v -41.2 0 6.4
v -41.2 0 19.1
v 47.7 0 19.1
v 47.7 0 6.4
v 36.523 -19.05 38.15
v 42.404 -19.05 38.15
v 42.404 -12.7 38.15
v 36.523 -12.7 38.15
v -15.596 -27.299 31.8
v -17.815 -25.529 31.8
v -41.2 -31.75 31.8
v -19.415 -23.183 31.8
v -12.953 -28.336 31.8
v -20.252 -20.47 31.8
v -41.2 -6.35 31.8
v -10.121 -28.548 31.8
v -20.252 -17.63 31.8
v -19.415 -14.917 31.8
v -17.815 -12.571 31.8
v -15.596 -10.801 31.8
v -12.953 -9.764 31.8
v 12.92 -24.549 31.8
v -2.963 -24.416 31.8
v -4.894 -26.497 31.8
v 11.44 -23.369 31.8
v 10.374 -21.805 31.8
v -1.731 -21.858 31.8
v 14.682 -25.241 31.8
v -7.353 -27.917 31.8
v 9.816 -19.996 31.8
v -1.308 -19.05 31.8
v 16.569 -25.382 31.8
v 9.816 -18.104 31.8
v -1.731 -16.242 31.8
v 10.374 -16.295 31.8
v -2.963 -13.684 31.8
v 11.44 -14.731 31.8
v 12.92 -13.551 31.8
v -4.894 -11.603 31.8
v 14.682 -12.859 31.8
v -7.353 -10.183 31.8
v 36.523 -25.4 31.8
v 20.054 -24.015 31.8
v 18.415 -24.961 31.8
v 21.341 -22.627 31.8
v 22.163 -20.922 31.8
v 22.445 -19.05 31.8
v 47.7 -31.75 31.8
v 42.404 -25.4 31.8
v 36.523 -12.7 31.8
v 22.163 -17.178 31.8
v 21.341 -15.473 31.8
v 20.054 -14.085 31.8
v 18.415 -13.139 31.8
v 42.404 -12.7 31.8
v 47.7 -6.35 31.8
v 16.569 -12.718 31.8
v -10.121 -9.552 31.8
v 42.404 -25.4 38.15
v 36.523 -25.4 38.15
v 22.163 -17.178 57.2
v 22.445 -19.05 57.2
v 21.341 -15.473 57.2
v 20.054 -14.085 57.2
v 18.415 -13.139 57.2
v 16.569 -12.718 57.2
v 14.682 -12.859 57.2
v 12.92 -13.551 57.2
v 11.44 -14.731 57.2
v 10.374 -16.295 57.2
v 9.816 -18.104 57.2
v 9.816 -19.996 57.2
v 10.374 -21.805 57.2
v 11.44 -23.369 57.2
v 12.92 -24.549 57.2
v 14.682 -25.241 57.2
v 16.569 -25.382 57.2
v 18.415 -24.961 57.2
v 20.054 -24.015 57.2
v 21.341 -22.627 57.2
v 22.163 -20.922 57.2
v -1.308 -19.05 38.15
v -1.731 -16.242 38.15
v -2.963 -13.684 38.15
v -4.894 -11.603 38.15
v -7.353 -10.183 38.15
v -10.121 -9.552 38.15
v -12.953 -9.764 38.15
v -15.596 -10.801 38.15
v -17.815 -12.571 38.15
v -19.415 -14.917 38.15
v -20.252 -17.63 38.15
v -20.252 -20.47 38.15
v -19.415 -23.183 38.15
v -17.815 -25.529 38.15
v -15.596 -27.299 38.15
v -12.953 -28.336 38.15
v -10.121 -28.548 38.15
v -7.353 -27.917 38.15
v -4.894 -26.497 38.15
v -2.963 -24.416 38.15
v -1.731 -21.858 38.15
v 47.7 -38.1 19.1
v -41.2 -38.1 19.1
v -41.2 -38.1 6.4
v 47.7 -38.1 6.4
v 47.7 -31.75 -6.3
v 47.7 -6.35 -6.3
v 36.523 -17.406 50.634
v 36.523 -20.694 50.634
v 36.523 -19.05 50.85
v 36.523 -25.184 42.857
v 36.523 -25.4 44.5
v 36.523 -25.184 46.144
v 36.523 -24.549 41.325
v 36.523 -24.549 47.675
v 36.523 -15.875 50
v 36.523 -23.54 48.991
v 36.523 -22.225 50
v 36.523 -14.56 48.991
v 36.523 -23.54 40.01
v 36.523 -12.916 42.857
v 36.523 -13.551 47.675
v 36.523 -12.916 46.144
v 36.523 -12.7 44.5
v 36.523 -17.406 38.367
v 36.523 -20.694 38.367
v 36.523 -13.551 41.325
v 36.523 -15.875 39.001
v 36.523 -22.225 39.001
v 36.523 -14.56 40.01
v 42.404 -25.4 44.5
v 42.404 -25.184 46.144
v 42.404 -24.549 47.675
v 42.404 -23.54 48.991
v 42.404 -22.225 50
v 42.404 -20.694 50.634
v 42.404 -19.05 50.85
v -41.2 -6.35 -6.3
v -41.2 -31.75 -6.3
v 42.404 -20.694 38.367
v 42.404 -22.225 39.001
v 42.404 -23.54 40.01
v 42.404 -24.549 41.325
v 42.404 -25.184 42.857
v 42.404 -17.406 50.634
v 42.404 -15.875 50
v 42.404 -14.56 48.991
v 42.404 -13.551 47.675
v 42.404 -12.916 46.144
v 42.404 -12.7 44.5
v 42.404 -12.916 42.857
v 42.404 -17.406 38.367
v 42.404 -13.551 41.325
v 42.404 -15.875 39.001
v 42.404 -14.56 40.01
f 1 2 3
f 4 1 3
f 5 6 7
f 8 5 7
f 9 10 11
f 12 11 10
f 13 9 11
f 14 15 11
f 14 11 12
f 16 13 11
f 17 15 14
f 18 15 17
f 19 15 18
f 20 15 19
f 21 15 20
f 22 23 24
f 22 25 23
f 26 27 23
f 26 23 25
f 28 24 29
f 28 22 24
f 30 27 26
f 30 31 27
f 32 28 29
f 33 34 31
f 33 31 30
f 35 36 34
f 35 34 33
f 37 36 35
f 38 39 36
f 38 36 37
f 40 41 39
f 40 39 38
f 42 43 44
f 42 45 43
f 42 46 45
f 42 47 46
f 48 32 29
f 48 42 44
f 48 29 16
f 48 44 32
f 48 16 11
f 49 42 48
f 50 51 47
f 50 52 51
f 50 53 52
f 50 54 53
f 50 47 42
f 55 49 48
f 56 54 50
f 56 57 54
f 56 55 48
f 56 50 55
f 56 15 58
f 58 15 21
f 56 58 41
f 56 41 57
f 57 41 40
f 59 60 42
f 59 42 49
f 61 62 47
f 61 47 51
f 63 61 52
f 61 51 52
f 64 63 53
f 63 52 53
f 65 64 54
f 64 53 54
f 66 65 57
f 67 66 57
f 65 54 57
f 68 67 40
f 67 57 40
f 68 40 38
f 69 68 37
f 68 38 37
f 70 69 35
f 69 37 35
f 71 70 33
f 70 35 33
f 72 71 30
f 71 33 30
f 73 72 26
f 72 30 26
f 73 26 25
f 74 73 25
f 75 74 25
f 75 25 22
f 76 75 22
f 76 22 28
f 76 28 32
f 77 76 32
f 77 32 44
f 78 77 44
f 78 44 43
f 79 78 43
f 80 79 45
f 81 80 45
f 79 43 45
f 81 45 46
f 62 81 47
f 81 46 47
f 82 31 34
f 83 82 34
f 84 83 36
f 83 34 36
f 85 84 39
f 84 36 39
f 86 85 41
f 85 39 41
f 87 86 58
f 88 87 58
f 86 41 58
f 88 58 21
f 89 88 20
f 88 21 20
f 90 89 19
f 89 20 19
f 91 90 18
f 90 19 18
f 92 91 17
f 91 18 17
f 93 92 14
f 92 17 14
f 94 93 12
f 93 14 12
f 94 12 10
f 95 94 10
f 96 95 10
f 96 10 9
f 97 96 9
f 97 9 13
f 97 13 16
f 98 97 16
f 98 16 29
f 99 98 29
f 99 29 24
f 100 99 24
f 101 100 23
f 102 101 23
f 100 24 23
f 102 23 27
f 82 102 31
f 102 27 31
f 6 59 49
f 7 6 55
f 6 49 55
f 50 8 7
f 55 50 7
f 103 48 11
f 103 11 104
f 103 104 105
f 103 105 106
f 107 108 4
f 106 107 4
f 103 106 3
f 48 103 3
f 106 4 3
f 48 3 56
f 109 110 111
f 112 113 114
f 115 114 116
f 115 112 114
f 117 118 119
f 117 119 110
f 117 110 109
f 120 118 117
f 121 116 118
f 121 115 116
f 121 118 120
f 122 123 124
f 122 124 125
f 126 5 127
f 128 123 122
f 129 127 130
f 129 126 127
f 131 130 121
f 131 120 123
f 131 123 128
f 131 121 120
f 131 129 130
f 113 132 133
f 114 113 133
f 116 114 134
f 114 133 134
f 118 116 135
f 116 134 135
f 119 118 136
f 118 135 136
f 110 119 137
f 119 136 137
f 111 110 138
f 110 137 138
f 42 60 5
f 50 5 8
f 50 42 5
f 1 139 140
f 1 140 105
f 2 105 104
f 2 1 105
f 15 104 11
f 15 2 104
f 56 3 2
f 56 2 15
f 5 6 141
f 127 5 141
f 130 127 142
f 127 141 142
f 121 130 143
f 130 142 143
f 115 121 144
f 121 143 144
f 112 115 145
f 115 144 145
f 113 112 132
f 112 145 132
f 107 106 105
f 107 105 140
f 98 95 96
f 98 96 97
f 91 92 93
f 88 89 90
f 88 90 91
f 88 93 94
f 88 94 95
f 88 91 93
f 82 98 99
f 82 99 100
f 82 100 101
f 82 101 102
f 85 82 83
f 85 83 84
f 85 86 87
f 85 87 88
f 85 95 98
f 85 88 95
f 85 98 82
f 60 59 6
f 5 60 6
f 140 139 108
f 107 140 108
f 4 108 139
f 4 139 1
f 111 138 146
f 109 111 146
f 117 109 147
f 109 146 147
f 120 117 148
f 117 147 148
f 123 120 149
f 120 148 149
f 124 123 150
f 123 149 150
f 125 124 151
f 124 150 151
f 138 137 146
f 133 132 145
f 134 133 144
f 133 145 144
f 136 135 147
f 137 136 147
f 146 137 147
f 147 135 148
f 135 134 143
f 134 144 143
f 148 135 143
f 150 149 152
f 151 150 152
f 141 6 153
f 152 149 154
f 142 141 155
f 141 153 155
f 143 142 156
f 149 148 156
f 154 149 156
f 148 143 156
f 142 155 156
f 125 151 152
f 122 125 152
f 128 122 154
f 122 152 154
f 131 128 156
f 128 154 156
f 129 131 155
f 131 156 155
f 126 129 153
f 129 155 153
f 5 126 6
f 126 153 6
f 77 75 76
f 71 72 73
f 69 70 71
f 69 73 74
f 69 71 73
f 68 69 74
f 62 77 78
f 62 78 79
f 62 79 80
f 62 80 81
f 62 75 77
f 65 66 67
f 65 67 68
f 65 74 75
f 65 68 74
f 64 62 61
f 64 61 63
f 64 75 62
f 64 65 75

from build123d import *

# Parameters (mm, degrees)
F0_W     = 88.9
F0_H     = 38.1
F1_DEPTH = 38.1
F3_DEPTH = 88.901
F4_R     = 6.35
F5_DEPTH = 25.4
F4_R_2   = 9.525
F6_DEPTH = 6.35
F4_W     = 5.880814
F4_H     = 12.7
F7_DEPTH = 19.05
F9_DEPTH = 5.880814


with BuildPart() as f1:
    # F0 (on Front) → F1 (new body)
    with BuildSketch(Plane.XZ):
        with Locations((3.249921, 12.750378)):
            Rectangle(F0_W, F0_H)
    extrude(amount=F1_DEPTH)

    # F2 (on face) → F3 (cut, through all)
    with BuildSketch(Plane(origin=(-41.200079, 0, 0), x_dir=(0, -1, 0), z_dir=(-1, 0, 0))):
        Polygon((0, 31.800378), (0, 19.100378), (6.35, 31.800378), align=None)
        Polygon((6.35, -6.299622), (0, 6.400378), (0, -6.299622), align=None)
        Polygon((38.1, 6.400378), (31.75, -6.299622), (38.1, -6.299622), align=None)
        Polygon((38.1, 31.800378), (31.75, 31.800378), (38.1, 19.100378), align=None)
    extrude(amount=-F3_DEPTH, mode=Mode.SUBTRACT)

    # F4 (on face) → F5 (join)
    with BuildSketch(Plane.XY.offset(31.800378)):
        with Locations((16.094854, -19.05)):
            Circle(F4_R)
    extrude(amount=F5_DEPTH)

    # F4 (on face) → F6 (join)
    with BuildSketch(Plane.XY.offset(31.800378)):
        with Locations((-10.833076, -19.05)):
            Circle(F4_R_2)
    extrude(amount=F6_DEPTH)

    # F4 (on face) → F7 (join)
    with BuildSketch(Plane.XY.offset(31.800378)):
        with Locations((39.463347, -19.05)):
            Rectangle(F4_W, F4_H)
    extrude(amount=F7_DEPTH)

    # F8 (on face) → F9 (cut, through all)
    with BuildSketch(Plane.YZ.offset(42.403754)):
        with BuildLine():
            Line((-25.4, 50.850378), (-25.4, 44.500378))
            ThreePointArc((-25.4, 44.500378), (-23.540128, 48.990506), (-19.05, 50.850378))
            Line((-19.05, 50.850378), (-25.4, 50.850378))
        make_face()
        with BuildLine():
            Line((-25.4, 44.500378), (-25.4, 38.150378))
            Line((-25.4, 38.150378), (-19.05, 38.150378))
            ThreePointArc((-19.05, 38.150378), (-23.540128, 40.01025), (-25.4, 44.500378))
        make_face()
        with BuildLine():
            ThreePointArc((-12.7, 44.500378), (-14.559872, 40.01025), (-19.05, 38.150378))
            Line((-19.05, 38.150378), (-12.7, 38.150378))
            Line((-12.7, 38.150378), (-12.7, 44.500378))
        make_face()
        with BuildLine():
            ThreePointArc((-19.05, 50.850378), (-14.559872, 48.990506), (-12.7, 44.500378))
            Line((-12.7, 44.500378), (-12.7, 50.850378))
            Line((-12.7, 50.850378), (-19.05, 50.850378))
        make_face()
    extrude(amount=-F9_DEPTH, mode=Mode.SUBTRACT)


solid = f1.part
